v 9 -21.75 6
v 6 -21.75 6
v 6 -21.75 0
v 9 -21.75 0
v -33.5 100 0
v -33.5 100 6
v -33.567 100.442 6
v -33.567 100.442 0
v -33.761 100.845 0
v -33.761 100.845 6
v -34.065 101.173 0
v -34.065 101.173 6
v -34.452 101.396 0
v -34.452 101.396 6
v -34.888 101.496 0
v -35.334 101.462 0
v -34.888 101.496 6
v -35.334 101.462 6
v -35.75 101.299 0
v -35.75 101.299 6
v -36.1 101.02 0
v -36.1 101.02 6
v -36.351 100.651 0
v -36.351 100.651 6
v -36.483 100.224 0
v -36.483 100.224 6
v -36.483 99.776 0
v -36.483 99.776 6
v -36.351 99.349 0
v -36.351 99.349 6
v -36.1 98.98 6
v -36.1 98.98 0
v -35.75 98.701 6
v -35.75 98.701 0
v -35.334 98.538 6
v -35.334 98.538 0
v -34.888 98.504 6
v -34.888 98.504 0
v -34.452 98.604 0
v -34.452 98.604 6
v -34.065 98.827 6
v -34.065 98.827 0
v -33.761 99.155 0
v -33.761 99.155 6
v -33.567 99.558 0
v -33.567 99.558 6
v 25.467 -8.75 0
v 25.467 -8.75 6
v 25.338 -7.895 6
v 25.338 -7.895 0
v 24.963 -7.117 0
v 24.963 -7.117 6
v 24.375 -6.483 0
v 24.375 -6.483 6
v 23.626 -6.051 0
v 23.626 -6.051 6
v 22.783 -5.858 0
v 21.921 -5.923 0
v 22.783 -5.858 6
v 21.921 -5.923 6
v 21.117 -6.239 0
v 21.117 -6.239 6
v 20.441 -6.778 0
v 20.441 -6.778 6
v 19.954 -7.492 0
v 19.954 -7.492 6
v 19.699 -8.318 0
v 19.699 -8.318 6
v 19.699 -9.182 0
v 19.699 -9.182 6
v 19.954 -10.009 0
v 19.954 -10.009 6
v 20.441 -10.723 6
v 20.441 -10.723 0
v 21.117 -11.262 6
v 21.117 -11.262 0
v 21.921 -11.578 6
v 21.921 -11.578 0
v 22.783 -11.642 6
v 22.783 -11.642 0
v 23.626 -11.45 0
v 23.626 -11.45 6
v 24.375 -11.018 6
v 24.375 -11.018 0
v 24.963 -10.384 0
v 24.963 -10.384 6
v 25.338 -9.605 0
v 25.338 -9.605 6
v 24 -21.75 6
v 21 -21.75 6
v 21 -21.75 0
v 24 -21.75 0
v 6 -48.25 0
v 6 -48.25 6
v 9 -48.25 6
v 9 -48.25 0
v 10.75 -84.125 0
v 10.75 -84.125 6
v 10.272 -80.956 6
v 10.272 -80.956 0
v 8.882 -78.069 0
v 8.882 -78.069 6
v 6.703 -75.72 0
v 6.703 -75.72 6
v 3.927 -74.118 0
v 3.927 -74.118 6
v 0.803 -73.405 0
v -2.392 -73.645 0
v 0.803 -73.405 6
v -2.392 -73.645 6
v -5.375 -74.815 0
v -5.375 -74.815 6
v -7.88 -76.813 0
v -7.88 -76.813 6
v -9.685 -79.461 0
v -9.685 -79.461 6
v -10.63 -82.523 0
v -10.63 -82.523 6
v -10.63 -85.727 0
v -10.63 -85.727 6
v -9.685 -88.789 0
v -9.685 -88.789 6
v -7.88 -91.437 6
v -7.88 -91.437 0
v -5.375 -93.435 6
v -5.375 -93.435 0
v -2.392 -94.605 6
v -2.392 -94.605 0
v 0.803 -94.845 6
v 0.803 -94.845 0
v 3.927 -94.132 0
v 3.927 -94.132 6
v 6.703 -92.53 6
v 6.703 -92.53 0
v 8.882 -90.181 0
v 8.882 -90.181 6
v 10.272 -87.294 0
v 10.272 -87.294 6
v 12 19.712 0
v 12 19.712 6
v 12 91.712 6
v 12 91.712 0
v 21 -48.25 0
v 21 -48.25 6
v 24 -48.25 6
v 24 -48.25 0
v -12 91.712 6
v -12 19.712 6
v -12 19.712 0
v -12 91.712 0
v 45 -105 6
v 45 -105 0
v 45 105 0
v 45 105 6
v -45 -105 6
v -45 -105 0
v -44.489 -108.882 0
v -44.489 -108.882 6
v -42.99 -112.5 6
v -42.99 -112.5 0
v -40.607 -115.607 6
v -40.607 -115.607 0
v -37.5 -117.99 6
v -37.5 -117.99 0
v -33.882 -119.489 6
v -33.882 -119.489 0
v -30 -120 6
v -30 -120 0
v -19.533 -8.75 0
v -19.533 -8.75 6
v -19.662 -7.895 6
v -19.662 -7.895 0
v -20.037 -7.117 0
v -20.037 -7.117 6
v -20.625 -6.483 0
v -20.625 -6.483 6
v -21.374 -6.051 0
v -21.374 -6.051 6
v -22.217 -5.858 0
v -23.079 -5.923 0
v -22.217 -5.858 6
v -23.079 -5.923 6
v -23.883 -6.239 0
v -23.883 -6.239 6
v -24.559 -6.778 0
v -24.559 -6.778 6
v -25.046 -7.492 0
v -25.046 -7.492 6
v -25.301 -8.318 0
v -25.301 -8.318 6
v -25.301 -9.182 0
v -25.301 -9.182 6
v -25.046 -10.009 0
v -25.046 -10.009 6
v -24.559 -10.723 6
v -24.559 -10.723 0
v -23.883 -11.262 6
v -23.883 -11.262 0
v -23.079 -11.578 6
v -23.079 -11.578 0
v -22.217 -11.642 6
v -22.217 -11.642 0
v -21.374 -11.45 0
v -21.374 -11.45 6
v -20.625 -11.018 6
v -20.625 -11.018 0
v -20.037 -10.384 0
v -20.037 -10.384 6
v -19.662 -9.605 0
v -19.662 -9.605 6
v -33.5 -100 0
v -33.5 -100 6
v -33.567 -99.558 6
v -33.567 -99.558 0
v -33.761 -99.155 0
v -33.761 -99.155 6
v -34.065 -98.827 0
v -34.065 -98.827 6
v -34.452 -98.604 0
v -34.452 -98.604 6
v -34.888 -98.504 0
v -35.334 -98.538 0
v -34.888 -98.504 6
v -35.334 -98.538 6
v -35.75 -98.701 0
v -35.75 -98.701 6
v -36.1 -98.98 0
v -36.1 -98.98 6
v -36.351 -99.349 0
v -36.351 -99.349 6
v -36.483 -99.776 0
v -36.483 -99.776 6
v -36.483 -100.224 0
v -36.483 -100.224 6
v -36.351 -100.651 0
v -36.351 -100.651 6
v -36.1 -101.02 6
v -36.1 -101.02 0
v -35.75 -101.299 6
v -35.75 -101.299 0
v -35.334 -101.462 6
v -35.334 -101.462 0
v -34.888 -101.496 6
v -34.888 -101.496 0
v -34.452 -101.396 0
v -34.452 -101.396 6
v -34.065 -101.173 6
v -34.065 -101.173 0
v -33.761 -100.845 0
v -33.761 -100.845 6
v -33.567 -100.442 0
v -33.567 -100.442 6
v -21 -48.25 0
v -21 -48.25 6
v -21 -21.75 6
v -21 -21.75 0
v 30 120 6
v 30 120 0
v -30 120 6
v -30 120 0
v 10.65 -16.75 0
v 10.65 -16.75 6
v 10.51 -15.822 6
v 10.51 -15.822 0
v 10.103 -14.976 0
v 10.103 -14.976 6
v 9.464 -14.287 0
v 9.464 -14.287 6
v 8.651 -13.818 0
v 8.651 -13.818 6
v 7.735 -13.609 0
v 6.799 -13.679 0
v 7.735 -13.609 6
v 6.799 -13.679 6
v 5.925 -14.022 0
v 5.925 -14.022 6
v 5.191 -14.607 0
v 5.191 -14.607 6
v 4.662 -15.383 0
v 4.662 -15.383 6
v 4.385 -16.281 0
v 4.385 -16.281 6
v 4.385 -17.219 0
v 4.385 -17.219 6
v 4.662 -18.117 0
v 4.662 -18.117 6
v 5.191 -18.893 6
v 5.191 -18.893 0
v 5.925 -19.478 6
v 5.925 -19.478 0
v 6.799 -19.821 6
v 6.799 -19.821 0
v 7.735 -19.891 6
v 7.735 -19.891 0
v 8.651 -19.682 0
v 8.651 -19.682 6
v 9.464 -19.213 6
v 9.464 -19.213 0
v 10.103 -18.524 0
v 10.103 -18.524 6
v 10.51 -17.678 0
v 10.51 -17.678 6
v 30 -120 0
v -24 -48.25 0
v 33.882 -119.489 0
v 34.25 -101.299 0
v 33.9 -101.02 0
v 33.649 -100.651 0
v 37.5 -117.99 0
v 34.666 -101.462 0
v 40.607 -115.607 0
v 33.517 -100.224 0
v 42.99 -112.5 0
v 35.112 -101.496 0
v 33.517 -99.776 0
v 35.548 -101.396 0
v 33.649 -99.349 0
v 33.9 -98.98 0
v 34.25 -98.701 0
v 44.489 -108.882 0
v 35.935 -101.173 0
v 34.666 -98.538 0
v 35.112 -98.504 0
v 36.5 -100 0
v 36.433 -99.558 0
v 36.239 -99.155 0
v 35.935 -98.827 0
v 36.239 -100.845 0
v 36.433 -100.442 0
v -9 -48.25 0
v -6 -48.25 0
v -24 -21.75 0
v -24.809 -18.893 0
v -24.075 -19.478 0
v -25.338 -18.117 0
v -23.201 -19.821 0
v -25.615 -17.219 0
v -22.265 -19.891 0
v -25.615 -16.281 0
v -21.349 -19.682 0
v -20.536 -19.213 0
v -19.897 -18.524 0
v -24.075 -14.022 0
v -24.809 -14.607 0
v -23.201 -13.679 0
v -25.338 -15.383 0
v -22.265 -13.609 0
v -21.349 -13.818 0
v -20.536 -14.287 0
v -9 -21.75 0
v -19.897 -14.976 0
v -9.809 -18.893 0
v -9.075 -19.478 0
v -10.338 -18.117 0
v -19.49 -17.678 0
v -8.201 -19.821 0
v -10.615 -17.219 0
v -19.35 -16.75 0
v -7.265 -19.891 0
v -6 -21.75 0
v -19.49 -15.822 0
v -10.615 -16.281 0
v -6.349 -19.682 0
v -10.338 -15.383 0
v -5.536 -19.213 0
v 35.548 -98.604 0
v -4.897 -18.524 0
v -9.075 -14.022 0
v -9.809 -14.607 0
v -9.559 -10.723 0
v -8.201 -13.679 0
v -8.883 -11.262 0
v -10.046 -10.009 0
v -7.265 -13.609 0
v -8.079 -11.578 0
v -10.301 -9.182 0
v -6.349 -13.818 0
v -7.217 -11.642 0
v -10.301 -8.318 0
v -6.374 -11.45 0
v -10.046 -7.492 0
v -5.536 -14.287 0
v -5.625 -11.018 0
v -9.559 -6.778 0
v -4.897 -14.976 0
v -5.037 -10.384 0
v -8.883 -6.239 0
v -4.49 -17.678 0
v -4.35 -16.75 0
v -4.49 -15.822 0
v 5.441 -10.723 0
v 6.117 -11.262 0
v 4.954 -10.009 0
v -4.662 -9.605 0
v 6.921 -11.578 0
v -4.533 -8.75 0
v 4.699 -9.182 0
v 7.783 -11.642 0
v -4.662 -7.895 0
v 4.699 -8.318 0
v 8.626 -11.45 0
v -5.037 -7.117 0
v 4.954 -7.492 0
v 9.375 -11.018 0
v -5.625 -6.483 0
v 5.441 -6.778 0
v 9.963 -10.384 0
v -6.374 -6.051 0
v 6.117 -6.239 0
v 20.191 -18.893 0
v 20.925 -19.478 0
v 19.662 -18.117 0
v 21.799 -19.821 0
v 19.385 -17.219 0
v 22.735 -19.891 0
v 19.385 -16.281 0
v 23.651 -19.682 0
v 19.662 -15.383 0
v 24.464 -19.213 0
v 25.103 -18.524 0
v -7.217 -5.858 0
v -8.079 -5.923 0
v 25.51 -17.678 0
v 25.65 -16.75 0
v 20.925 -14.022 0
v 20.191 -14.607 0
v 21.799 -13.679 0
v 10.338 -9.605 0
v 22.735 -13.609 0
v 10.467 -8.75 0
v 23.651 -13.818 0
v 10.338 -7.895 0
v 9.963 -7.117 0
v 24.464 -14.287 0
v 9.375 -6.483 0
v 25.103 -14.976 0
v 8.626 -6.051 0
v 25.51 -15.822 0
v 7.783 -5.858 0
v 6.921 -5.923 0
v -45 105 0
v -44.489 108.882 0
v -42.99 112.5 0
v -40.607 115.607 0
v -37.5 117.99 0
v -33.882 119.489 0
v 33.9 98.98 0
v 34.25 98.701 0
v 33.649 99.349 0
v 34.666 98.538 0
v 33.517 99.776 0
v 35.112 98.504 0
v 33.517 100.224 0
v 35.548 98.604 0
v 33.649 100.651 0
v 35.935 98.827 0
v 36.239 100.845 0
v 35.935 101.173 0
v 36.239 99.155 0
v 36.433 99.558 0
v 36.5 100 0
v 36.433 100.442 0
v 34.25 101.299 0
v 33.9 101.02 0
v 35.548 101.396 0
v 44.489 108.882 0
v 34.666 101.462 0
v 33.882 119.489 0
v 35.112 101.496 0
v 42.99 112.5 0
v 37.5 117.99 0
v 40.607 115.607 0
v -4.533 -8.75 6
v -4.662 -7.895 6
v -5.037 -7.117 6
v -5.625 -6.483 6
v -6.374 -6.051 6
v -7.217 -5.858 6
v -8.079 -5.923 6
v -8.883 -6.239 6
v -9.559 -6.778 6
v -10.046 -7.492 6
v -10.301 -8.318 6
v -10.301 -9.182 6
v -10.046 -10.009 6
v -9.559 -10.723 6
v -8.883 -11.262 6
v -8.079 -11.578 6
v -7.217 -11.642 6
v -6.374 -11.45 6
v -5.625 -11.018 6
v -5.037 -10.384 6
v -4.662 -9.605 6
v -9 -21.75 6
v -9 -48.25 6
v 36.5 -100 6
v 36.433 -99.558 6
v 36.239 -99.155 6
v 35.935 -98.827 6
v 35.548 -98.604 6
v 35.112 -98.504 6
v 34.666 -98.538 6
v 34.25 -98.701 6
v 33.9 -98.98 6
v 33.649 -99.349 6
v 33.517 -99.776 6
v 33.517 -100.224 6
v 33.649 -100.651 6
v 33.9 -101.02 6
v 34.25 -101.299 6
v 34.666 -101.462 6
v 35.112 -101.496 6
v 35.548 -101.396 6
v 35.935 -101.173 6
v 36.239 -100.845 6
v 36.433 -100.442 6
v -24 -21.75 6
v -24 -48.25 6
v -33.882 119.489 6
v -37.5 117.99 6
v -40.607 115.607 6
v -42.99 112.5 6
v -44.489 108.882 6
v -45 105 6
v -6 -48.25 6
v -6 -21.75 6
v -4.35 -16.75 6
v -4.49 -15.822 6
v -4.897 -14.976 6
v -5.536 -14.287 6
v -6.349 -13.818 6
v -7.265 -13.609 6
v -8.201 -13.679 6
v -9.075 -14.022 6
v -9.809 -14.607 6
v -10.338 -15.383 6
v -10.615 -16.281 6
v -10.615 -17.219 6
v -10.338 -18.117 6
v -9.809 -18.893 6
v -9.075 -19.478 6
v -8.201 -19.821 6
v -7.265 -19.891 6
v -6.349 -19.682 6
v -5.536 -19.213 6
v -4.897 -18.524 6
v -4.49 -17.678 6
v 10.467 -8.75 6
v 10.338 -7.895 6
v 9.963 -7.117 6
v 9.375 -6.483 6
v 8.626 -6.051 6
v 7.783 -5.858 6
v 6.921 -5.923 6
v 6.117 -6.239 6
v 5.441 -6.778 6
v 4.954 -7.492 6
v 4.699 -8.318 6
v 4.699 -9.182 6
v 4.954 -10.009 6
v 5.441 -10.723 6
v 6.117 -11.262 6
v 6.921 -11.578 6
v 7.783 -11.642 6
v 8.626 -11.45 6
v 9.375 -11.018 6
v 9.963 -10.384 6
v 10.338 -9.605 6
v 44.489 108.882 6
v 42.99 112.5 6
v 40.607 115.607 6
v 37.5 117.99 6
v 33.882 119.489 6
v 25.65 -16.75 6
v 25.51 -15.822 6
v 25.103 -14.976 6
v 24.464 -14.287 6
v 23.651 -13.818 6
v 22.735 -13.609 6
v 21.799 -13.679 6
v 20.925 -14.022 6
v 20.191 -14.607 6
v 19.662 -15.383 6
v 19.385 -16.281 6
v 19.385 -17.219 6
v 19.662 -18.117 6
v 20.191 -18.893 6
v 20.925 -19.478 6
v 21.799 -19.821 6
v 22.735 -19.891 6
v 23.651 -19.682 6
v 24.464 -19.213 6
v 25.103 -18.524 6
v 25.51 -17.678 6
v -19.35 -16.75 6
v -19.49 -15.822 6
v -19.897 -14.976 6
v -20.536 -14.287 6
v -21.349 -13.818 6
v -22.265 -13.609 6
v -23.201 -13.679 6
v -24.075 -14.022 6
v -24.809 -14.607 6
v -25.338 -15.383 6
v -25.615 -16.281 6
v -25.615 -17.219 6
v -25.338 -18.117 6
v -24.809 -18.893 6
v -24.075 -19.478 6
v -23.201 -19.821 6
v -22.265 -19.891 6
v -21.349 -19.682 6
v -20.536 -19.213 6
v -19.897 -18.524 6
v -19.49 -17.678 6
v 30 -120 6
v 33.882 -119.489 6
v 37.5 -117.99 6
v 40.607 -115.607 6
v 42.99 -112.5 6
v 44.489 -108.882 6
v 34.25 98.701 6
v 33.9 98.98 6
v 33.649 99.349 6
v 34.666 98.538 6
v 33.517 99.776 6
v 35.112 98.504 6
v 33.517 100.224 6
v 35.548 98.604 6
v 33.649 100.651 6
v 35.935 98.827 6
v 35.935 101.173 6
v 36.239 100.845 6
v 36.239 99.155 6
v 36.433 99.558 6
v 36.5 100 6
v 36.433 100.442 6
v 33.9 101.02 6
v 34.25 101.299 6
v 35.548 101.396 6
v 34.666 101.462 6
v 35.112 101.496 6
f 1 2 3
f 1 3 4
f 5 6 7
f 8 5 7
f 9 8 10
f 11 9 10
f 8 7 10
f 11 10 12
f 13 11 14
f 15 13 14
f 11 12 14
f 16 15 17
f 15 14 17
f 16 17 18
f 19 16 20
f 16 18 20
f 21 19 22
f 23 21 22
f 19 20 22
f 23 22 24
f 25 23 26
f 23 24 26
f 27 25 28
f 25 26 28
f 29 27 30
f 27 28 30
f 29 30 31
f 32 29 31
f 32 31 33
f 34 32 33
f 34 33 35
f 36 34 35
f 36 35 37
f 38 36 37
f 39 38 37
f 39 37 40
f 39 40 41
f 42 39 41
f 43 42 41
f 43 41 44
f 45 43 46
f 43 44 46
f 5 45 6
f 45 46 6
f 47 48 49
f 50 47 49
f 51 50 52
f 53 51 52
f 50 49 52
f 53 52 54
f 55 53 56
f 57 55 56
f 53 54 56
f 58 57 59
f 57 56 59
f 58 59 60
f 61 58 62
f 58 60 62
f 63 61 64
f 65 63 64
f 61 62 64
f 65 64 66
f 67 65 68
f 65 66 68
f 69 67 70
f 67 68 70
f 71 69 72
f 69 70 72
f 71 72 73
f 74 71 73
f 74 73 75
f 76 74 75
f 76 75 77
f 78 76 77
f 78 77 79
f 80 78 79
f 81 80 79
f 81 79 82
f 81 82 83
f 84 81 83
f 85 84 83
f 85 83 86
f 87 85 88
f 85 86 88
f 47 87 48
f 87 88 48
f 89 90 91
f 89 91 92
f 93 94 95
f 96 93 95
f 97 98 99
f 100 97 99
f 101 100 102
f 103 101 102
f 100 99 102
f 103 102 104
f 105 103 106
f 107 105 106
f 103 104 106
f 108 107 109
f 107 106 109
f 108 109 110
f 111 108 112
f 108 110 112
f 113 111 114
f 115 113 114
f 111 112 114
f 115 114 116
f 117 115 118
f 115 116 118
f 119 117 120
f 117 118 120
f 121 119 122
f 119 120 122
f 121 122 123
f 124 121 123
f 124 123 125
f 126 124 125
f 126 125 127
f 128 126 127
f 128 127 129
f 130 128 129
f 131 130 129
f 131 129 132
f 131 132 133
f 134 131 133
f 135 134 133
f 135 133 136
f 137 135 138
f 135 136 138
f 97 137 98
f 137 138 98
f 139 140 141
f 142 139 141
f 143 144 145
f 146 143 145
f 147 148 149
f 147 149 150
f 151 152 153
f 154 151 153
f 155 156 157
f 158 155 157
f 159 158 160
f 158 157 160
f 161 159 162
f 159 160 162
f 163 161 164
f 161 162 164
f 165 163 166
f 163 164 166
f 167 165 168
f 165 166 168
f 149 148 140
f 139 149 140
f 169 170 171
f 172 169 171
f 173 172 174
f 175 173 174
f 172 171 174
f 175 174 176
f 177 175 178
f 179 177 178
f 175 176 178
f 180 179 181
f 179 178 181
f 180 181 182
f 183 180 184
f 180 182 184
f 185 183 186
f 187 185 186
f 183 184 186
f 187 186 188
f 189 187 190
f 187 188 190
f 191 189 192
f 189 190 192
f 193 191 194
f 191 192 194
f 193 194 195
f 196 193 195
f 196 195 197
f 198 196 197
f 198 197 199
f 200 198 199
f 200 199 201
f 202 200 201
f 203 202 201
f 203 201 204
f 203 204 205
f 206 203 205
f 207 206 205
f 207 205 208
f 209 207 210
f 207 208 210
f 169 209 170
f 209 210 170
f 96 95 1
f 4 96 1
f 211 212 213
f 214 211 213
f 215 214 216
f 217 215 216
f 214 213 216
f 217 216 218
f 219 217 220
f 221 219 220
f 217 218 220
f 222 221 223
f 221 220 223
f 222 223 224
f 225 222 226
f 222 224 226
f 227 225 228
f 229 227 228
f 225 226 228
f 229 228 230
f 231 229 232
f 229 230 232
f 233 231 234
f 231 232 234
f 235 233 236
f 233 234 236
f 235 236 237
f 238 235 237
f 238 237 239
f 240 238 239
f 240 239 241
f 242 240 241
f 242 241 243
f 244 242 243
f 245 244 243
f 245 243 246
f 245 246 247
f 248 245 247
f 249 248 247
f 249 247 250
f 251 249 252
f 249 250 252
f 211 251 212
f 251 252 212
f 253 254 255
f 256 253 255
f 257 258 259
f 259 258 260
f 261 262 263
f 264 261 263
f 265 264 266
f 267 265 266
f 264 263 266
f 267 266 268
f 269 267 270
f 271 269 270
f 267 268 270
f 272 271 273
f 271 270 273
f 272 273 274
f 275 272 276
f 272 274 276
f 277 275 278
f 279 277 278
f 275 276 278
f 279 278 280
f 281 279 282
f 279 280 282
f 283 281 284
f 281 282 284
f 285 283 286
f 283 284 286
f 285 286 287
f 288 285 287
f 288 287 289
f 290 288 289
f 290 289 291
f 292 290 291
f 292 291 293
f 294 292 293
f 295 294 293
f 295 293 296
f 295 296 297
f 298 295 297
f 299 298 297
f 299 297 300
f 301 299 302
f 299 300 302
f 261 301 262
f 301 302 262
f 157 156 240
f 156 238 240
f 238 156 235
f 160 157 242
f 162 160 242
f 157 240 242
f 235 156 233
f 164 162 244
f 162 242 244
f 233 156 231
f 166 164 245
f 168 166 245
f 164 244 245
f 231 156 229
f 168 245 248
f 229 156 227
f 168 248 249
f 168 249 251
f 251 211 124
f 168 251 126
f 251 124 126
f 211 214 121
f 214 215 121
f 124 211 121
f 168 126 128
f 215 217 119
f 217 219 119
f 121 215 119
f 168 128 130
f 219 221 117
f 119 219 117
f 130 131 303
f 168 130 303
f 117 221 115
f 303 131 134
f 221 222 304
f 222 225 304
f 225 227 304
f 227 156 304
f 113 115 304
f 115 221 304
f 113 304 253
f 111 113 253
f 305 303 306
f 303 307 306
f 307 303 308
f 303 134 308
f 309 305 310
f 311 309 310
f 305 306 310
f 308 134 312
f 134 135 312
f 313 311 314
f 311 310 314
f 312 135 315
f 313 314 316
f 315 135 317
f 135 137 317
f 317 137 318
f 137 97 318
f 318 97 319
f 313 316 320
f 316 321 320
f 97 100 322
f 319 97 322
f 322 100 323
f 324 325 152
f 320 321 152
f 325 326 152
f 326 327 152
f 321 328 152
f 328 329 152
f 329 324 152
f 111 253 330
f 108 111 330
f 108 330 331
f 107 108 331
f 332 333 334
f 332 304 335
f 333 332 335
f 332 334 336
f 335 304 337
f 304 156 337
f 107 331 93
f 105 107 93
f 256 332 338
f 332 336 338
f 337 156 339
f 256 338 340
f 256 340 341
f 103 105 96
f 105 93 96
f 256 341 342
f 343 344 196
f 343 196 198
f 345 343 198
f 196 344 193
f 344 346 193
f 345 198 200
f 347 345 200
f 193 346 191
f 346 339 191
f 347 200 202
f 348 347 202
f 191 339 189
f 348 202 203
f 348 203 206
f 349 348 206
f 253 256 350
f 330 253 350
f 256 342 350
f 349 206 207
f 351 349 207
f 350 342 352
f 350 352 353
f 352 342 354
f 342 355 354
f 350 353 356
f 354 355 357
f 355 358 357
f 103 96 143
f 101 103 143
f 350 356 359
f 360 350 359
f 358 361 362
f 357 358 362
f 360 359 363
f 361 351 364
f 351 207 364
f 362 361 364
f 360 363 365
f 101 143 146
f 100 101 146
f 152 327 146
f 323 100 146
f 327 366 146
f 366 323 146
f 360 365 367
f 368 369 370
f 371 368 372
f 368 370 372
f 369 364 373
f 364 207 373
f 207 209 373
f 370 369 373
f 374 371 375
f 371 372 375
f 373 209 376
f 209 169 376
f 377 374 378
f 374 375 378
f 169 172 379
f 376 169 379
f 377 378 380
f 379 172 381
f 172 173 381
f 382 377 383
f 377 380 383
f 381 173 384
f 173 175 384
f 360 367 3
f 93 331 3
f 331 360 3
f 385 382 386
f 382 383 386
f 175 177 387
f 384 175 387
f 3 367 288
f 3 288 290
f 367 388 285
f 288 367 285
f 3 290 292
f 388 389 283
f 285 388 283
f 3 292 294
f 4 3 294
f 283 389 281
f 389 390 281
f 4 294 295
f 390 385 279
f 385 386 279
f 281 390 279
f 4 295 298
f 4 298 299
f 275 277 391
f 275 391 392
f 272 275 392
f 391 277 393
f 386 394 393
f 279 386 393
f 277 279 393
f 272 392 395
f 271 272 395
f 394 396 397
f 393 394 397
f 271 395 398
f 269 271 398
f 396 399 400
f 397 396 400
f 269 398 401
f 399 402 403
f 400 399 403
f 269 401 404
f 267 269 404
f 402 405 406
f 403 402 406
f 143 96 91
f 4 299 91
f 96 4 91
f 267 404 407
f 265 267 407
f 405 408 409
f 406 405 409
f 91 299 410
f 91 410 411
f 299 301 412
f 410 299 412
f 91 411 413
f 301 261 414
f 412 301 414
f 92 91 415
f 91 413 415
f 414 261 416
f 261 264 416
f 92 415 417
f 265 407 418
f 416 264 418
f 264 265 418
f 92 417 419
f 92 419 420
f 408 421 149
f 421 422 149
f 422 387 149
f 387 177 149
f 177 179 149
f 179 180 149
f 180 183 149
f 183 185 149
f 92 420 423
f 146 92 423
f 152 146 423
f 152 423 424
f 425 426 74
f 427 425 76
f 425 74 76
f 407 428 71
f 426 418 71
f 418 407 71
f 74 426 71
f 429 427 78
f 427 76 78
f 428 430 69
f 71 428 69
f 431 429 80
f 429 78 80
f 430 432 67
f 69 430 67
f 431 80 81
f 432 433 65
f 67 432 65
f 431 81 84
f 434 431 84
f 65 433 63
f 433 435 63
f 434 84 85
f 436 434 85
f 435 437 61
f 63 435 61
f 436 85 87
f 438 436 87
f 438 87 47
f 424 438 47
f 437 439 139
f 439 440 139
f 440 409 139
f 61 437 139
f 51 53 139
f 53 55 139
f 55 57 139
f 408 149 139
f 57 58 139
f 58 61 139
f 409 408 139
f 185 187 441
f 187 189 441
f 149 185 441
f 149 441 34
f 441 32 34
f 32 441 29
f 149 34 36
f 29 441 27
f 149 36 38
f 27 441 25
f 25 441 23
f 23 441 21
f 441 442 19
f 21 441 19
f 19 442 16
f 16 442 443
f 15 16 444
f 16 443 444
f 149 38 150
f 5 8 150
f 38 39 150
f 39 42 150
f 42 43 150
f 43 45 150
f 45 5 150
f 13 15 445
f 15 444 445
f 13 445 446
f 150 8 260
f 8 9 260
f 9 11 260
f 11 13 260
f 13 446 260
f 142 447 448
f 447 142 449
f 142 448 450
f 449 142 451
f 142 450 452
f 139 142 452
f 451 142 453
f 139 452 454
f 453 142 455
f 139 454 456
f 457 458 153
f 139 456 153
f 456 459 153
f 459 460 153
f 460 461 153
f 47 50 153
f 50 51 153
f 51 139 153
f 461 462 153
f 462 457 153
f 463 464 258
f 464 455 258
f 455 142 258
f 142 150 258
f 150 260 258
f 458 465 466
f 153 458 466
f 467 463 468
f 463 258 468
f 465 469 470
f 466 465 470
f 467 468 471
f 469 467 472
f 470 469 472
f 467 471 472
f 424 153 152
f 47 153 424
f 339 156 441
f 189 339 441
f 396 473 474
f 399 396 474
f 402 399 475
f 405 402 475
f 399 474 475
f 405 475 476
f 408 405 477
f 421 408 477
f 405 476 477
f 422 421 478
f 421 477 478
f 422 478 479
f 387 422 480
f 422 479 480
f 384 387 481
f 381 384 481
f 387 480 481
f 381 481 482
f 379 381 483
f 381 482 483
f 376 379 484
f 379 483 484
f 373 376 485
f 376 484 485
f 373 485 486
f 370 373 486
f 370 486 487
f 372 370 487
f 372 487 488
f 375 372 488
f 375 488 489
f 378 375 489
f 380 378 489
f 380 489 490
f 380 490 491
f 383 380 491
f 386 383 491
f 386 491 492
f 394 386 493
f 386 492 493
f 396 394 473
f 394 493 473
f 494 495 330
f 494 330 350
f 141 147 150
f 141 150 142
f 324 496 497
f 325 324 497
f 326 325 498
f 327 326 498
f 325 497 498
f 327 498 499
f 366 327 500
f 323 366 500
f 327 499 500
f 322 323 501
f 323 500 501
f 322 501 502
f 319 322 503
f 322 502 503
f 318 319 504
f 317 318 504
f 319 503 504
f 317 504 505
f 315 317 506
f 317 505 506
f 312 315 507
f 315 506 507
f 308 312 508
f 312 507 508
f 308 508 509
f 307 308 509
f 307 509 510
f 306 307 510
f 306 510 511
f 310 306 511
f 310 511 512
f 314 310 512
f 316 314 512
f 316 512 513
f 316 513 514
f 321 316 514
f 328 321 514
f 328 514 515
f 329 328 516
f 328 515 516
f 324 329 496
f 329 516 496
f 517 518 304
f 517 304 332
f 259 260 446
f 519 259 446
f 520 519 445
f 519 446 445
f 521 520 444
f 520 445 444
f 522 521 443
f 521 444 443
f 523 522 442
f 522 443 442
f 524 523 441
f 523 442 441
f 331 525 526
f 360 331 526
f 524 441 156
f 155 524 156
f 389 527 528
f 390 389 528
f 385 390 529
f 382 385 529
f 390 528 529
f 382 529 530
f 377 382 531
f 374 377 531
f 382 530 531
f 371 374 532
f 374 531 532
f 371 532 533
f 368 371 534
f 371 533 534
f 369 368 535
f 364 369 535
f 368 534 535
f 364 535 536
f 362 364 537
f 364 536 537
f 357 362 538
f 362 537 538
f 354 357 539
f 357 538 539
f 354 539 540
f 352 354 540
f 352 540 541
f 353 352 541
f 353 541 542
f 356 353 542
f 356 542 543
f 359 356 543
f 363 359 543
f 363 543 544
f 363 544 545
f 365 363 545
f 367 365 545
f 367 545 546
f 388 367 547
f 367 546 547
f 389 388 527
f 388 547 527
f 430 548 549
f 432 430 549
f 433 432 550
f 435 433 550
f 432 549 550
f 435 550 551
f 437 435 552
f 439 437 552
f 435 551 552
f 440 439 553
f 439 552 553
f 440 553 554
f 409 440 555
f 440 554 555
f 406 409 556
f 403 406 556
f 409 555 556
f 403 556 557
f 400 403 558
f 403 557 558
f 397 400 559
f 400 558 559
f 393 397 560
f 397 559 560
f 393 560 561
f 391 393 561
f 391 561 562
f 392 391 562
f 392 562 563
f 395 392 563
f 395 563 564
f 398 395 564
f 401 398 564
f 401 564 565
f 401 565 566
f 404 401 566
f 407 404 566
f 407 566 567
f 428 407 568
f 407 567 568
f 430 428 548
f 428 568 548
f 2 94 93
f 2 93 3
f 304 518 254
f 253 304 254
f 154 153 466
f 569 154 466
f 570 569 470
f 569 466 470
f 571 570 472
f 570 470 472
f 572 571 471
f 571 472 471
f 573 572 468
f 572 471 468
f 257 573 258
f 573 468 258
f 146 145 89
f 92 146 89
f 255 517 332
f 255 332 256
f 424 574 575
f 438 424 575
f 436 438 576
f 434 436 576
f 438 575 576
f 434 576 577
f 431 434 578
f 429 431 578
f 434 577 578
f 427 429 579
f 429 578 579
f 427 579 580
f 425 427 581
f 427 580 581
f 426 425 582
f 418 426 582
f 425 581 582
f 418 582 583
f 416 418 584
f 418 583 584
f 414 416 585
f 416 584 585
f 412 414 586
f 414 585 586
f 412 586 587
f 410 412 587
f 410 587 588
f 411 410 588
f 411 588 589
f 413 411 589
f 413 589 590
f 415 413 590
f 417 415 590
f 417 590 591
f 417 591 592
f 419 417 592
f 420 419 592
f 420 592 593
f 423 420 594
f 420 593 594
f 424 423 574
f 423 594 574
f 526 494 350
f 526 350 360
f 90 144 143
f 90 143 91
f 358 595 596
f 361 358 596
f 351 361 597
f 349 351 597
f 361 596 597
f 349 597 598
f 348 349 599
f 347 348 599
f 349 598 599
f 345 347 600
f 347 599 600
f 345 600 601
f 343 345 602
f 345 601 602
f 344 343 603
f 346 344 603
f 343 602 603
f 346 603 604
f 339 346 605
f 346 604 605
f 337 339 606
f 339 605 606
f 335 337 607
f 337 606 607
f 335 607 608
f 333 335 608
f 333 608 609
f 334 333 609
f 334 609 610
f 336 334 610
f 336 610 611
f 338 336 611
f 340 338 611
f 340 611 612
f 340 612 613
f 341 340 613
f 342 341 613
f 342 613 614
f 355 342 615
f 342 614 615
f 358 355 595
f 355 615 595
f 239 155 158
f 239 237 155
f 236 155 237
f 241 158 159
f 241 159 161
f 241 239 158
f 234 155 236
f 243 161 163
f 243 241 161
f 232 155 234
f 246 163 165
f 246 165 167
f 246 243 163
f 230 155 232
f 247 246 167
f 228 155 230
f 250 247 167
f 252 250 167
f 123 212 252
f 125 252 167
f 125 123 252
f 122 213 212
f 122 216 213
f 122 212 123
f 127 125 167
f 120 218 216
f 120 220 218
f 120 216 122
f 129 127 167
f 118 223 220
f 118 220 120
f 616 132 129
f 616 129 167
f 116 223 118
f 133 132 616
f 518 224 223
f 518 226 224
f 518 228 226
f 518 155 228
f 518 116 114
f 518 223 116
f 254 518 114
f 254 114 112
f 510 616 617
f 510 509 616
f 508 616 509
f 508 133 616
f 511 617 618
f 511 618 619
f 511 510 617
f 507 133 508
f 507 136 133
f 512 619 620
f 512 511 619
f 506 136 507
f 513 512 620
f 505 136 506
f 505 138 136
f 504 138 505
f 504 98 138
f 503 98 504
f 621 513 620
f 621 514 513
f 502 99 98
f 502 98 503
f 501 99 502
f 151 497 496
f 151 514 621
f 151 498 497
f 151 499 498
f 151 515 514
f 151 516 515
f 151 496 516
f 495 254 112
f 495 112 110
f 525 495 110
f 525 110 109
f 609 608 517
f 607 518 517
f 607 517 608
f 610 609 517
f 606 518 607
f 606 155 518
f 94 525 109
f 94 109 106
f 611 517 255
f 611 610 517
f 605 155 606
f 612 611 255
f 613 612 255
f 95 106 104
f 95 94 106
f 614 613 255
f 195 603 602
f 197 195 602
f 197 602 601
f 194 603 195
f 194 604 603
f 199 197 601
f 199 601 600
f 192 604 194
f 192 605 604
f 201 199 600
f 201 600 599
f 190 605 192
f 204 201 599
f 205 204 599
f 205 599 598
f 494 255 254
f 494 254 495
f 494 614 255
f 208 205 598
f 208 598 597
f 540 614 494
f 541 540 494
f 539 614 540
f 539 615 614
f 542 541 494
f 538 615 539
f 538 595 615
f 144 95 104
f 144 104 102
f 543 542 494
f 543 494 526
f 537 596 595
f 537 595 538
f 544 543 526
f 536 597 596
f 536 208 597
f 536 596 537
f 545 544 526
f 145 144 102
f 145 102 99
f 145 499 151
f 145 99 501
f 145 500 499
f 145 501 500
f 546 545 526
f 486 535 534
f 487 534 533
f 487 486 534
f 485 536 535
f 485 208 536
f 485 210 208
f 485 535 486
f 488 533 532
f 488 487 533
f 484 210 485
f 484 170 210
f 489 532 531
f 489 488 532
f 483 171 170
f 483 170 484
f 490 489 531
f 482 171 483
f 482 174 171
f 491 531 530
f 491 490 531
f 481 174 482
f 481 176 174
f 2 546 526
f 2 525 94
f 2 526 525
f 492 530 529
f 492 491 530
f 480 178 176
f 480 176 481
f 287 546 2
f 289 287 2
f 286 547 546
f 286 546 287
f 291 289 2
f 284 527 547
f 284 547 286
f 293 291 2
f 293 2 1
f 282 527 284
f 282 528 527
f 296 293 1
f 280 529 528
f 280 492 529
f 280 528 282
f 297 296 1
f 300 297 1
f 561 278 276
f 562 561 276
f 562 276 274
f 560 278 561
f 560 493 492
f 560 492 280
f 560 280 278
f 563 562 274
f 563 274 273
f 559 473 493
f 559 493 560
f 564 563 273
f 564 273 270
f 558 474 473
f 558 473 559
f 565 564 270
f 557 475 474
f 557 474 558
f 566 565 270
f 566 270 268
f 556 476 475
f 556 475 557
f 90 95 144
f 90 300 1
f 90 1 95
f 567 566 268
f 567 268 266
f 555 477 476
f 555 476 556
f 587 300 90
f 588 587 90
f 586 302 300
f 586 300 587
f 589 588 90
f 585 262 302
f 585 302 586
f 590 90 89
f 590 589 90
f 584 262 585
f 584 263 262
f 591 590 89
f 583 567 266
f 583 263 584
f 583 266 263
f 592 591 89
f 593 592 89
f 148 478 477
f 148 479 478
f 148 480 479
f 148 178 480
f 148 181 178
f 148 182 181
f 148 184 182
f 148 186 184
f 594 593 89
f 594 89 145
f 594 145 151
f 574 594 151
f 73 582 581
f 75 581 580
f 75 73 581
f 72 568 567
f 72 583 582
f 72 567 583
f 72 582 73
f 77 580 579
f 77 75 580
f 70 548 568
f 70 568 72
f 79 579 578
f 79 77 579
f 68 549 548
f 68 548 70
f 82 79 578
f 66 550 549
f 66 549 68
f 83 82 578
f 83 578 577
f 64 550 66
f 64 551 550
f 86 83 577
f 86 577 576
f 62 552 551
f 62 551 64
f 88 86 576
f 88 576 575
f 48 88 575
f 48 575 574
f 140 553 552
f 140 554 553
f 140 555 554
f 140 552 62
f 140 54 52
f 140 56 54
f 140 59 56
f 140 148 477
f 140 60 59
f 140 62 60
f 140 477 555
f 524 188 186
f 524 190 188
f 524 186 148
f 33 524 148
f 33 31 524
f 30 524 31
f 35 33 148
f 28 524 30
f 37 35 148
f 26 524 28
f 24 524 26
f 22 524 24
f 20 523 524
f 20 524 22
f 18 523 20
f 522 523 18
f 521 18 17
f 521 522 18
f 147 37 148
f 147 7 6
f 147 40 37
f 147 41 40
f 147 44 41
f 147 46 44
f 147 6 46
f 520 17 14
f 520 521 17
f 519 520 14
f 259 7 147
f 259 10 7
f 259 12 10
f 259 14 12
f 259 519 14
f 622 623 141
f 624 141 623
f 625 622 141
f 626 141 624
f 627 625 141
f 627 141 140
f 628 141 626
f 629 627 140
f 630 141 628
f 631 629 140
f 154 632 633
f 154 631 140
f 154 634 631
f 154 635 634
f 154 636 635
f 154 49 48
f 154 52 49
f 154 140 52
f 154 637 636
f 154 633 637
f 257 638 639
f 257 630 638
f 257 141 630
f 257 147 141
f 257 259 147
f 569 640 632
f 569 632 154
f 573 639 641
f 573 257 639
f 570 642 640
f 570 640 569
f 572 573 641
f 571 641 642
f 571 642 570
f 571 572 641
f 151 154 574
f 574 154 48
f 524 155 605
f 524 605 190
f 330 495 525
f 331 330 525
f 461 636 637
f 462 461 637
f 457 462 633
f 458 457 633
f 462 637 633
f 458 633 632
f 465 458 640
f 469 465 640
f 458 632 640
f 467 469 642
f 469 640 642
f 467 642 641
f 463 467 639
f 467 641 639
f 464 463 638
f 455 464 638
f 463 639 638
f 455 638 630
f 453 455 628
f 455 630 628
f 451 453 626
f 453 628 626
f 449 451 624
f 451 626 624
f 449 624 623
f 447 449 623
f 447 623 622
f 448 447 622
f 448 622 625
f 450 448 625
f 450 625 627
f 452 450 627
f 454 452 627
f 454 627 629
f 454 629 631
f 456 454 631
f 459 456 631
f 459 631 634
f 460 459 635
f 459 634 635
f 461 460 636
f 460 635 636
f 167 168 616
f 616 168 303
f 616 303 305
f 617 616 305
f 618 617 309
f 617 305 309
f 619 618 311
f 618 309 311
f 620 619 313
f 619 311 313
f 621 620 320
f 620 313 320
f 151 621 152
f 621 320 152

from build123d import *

# Parameters (mm, degrees)
F1_DEPTH = 6
F2_W     = 24
F2_H     = 72
F3_DEPTH = 6
F4_W     = 3
F4_H     = 26.5
F4_R     = 2.9
F4_R_2   = 3.15
F5_DEPTH = 6
F6_R     = 10.75
F7_DEPTH = 6
F8_R     = 1.5
F9_DEPTH = 6


with BuildPart() as f1:
    # F0 (on Top) → F1 (new body)
    with BuildSketch(Plane.XY):
        with BuildLine():
            Line((-30, -120), (30, -120))
            ThreePointArc((30, -120), (40.606602, -115.606602), (45, -105))
            Line((45, -105), (45, 105))
            ThreePointArc((45, 105), (40.606602, 115.606602), (30, 120))
            Line((30, 120), (-30, 120))
            ThreePointArc((-30, 120), (-40.606602, 115.606602), (-45, 105))
            Line((-45, 105), (-45, -105))
            ThreePointArc((-45, -105), (-40.606602, -115.606602), (-30, -120))
        make_face()
    extrude(amount=F1_DEPTH)

    # F2 (on face) → F3 (cut, through all)
    with BuildSketch(Plane.XY.offset(6)):
        with Locations((0, 55.712325)):
            Rectangle(F2_W, F2_H)
    extrude(amount=-F3_DEPTH, mode=Mode.SUBTRACT)

    # F4 (on face) → F5 (cut, through all)
    with BuildSketch(Plane.XY.offset(6)):
        with Locations((-22.5, -35)):
            Rectangle(F4_W, F4_H)
        with Locations((-22.433495, -8.750276)):
            Circle(F4_R)
        with Locations((-22.5, -16.75)):
            Circle(F4_R_2)
        with Locations((-7.5, -16.75)):
            Circle(F4_R_2)
        with Locations((-7.5, -35)):
            Rectangle(F4_W, F4_H)
        with Locations((-7.433495, -8.750276)):
            Circle(F4_R)
        with Locations((7.5, -16.75)):
            Circle(F4_R_2)
        with Locations((7.5, -35)):
            Rectangle(F4_W, F4_H)
        with Locations((7.566505, -8.750276)):
            Circle(F4_R)
        with Locations((22.5, -16.75)):
            Circle(F4_R_2)
        with Locations((22.5, -35)):
            Rectangle(F4_W, F4_H)
        with Locations((22.566505, -8.750276)):
            Circle(F4_R)
    extrude(amount=-F5_DEPTH, mode=Mode.SUBTRACT)

    # F6 (on face) → F7 (cut, through all)
    with BuildSketch(Plane.XY.offset(6)):
        with Locations((0, -84.125)):
            Circle(F6_R)
    extrude(amount=-F7_DEPTH, mode=Mode.SUBTRACT)

    # F8 (on face) → F9 (cut, through all)
    with BuildSketch(Plane.XY.offset(6)):
        with Locations((-35, -100)):
            Circle(F8_R)
        with Locations((35, -100)):
            Circle(F8_R)
        with Locations((35, 100)):
            Circle(F8_R)
        with Locations((-35, 100)):
            Circle(F8_R)
    extrude(amount=-F9_DEPTH, mode=Mode.SUBTRACT)


solid = f1.part
